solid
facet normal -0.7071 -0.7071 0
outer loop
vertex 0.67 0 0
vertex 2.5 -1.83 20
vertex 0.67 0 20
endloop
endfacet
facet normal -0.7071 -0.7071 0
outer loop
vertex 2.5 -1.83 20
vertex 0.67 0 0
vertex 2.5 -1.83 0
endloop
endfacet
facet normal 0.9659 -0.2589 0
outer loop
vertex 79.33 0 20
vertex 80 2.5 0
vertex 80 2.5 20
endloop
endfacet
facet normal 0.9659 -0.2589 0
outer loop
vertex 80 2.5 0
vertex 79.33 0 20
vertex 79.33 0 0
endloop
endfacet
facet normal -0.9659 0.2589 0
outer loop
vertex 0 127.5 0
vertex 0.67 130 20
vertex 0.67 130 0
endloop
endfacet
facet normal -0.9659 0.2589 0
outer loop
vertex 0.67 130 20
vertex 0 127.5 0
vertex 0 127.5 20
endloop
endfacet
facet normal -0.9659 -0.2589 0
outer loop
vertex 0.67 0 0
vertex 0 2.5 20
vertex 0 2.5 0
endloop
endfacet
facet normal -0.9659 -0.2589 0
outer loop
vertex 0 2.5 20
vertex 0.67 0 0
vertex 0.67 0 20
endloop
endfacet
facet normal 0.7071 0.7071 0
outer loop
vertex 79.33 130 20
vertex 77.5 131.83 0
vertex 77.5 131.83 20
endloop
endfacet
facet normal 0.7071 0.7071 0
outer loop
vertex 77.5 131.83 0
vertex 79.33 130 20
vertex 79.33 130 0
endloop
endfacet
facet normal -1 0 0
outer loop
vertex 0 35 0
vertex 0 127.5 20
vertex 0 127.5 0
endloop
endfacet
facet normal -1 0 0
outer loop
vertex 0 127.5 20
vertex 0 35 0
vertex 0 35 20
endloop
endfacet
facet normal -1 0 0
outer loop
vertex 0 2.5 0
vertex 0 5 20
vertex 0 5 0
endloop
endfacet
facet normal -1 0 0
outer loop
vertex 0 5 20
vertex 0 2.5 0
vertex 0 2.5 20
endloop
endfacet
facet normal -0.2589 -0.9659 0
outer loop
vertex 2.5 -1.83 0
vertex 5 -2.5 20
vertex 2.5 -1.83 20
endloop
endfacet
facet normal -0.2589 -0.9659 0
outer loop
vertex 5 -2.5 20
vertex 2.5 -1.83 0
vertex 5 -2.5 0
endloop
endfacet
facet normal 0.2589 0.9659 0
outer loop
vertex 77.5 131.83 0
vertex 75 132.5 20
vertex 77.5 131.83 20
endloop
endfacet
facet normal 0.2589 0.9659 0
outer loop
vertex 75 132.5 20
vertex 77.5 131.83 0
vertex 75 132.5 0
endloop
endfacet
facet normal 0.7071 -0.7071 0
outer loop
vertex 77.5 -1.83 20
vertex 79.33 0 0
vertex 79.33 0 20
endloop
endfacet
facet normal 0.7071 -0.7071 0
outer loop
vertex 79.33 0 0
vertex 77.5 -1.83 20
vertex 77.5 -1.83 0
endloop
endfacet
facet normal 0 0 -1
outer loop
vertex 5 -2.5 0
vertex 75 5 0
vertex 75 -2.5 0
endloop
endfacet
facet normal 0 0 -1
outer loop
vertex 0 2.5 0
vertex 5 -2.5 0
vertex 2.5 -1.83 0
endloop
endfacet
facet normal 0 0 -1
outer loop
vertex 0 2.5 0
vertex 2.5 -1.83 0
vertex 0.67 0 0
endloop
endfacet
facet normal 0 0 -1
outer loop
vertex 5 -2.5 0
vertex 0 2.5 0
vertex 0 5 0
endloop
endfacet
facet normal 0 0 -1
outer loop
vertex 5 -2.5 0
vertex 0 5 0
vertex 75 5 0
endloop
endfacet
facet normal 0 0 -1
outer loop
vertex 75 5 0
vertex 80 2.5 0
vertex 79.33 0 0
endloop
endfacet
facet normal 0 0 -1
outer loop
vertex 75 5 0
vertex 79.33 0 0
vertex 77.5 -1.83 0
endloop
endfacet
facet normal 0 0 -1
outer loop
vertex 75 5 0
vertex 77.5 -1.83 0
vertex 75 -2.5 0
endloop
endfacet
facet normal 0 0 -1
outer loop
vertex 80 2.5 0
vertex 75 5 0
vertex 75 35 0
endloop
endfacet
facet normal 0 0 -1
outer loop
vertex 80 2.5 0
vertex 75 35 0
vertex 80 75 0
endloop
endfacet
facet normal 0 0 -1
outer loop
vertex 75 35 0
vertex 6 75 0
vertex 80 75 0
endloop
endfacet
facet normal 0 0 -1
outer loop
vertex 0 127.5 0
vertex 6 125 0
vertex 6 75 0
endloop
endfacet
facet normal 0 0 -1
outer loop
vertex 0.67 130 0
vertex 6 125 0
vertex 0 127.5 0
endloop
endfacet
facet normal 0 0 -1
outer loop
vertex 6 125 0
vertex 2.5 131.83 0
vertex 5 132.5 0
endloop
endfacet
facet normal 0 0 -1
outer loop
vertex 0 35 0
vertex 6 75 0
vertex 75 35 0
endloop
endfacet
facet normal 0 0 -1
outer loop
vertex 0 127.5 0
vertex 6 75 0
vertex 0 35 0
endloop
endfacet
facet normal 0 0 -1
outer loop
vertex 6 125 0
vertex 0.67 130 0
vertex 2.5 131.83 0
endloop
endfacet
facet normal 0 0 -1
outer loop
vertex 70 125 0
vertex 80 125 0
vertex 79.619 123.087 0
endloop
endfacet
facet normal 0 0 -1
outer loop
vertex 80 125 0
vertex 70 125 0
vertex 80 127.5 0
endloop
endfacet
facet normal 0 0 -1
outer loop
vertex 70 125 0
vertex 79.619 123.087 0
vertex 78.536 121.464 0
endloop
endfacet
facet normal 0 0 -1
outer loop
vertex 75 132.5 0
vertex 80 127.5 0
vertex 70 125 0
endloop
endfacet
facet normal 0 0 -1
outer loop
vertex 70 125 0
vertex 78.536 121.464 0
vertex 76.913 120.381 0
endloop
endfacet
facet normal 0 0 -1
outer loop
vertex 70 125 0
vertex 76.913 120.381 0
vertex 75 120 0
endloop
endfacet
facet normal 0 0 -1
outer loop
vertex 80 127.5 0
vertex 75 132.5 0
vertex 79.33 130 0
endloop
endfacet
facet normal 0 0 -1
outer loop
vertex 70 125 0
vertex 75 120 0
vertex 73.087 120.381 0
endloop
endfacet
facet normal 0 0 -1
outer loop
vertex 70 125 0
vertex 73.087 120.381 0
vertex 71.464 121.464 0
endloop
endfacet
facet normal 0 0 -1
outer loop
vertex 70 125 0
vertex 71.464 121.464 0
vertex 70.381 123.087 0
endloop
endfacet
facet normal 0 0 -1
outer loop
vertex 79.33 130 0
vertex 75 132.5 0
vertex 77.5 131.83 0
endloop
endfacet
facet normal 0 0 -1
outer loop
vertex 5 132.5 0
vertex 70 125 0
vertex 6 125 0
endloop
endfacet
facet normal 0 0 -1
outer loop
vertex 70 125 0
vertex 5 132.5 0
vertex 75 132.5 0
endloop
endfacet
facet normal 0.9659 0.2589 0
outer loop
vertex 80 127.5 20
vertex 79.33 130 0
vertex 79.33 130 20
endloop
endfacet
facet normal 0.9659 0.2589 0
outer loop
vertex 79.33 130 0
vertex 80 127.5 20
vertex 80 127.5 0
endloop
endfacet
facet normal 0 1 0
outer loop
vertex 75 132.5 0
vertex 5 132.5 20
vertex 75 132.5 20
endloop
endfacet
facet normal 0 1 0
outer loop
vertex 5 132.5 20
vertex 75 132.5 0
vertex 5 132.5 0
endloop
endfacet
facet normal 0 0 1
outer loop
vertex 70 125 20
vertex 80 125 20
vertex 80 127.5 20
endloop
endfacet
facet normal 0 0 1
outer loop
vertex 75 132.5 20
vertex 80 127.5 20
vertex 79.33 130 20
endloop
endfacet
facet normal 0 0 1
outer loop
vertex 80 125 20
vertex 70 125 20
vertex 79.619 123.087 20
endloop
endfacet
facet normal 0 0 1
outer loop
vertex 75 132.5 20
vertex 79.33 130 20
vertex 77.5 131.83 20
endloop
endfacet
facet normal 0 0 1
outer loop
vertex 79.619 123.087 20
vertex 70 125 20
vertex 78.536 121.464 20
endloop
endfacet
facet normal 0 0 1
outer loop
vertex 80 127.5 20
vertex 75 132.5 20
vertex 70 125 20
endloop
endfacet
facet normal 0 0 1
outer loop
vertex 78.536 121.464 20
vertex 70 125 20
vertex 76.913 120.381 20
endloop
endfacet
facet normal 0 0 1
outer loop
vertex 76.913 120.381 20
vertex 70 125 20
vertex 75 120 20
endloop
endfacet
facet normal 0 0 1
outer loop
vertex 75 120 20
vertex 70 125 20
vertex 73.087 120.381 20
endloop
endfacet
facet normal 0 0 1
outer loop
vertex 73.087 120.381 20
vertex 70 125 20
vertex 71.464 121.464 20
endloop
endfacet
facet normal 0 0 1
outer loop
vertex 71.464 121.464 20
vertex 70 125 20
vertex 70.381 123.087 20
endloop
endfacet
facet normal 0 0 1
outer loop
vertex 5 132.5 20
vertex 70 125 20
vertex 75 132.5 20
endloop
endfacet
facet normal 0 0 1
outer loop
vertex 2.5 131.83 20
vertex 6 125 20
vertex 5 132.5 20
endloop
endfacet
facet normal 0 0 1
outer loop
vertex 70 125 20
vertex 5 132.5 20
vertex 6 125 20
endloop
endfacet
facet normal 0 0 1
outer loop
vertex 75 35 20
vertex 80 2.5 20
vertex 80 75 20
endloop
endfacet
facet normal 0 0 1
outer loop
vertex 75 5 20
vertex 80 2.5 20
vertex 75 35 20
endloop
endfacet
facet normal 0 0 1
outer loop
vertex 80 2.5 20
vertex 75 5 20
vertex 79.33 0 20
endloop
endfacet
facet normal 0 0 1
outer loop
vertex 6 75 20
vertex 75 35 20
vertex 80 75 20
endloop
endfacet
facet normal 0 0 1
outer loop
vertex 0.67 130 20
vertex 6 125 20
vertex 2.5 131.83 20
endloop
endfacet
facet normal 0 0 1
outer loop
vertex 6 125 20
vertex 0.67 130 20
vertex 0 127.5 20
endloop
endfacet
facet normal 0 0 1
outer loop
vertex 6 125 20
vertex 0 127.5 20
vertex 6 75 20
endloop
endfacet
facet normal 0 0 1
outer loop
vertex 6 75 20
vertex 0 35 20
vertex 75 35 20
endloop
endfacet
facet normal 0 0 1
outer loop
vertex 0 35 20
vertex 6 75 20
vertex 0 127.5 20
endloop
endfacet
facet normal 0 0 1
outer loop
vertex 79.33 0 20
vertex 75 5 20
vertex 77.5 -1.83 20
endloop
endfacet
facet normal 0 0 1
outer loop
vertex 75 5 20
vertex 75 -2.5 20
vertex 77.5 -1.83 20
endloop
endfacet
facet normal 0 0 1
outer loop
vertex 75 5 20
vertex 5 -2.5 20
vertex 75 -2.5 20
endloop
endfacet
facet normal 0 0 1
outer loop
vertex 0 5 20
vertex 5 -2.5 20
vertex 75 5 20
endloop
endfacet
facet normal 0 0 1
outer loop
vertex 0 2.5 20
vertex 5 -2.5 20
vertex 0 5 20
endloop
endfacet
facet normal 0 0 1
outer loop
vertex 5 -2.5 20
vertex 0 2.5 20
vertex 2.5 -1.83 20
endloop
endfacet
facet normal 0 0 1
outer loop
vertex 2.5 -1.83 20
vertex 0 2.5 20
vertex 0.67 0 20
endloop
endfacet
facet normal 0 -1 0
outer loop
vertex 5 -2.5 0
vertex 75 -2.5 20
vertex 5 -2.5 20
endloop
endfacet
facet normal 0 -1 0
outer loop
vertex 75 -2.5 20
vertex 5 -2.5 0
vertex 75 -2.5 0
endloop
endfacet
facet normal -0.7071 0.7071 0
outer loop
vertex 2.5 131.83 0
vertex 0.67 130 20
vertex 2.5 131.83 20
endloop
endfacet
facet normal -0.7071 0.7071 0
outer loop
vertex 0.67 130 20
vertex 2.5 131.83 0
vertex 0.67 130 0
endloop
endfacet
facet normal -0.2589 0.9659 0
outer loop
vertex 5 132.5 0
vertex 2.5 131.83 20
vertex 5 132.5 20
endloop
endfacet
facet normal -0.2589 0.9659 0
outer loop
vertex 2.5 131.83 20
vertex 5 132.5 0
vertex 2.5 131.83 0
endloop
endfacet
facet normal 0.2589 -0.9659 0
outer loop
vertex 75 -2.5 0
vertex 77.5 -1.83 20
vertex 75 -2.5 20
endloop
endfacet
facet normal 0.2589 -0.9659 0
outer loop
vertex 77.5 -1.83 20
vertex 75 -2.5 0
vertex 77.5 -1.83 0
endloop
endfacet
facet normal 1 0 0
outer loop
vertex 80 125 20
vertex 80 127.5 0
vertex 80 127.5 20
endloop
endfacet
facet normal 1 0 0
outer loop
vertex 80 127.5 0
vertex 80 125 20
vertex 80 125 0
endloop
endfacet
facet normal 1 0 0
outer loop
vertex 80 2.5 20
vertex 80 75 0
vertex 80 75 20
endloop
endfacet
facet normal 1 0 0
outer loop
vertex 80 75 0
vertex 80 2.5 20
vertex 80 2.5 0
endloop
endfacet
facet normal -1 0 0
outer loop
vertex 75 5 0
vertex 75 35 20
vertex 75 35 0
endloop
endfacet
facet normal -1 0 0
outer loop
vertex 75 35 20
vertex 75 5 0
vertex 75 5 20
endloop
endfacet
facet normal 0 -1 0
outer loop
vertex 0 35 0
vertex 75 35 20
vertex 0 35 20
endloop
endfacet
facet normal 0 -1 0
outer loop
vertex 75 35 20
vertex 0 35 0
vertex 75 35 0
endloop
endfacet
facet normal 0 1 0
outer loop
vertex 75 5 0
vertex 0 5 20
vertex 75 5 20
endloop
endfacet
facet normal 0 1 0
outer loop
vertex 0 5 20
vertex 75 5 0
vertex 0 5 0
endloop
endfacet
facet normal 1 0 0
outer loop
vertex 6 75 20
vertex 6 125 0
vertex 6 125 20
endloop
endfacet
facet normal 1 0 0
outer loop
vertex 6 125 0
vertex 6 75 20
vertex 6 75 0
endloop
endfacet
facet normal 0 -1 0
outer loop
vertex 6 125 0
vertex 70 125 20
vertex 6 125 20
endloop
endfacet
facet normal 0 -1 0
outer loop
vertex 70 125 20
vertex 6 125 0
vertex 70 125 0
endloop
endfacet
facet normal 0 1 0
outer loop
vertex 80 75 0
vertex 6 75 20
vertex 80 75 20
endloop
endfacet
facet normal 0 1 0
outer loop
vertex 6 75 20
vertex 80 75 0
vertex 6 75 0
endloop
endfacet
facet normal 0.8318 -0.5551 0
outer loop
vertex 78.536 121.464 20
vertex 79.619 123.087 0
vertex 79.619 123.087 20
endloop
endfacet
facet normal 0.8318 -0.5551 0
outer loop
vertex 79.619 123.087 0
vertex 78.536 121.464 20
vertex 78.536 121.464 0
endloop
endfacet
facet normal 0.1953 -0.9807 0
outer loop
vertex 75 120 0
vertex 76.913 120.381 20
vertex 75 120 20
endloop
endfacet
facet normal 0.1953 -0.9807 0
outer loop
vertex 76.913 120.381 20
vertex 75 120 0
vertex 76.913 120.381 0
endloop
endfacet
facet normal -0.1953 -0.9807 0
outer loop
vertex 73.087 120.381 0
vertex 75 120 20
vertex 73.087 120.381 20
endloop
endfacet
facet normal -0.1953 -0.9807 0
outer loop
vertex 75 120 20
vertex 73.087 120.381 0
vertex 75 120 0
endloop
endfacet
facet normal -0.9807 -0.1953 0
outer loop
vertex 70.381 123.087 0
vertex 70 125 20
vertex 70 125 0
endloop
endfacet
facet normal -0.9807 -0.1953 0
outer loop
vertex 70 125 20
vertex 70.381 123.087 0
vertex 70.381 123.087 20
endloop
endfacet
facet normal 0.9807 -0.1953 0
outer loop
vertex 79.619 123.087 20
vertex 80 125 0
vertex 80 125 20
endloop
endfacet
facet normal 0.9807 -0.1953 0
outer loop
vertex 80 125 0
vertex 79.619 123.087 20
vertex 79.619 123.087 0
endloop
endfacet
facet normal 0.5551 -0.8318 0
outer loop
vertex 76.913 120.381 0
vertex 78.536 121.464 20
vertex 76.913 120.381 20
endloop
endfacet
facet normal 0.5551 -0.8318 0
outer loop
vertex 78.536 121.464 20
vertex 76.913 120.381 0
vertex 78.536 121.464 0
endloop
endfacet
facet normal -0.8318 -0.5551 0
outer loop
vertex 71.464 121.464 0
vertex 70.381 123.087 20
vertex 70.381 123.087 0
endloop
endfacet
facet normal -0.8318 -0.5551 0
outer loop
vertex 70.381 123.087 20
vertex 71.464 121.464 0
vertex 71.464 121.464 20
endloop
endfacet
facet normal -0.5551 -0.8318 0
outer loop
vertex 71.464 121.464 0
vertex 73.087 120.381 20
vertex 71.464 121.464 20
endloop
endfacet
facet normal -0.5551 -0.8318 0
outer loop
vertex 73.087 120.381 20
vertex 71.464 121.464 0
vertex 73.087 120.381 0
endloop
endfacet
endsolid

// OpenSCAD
// [FL_INDEX: keywords="openscad, 3d_parametric, Customizable_Anything_Hook, csg_solid" | COT="Parametric OpenSCAD design from 3DCodeverse"]
// Title: Customizable Anything Hook

// Customizable Desk Hook
// by knarfishness
// Diesel Powered Robotics, 2013

// variables

//Total width
width = 80;

//Total length
length = 130;

// The width of the surface to clamp to
clamp_width = 30;

// The width of the hook
hook_width = 50;

// The thickness of the hook
thickness = 5;

// Hook height
height = 20;

// Catch Diameter 
catch = 5;

// Rounding Radius (1 to 40)
rounding_radius = 5;

// Clamp Depth Offset
clamp_offset = 0;

// Hook Depth Offset
hook_offset = 0;

add_catch = "true"; // [true,false]


// size - [x,y,z]
// radius - radius of corners
module roundedRect(size, radius)
{
	x = size[0];
	y = size[1];
	z = size[2];

	linear_extrude(height=z)
	hull()
	{
		// place 4 circles in the corners, with the given radius
		translate([(-x/2)+(radius/2), (-y/2)+(radius/2), 0])
		circle(r=radius);
	
		translate([(x/2)-(radius/2), (-y/2)+(radius/2), 0])
		circle(r=radius);
	
		translate([(-x/2)+(radius/2), (y/2)-(radius/2), 0])
		circle(r=radius);
	
		translate([(x/2)-(radius/2), (y/2)-(radius/2), 0])
		circle(r=radius);
	}
}


module base()
{
	//cube([width, length, height]);
	translate([width/2,length/2,0])
	roundedRect([width-rounding_radius, length, height], rounding_radius, $fn=12);
}

module clamp()
{
	translate([-1,thickness,-2])
	cube([width-thickness-clamp_offset+1, clamp_width, height+4]);
}

module hook()
{
	translate([thickness + hook_offset +1, length - hook_width - thickness,-2])
	cube([width-thickness+1, hook_width, height+4]);
}

module top()
{
	difference()
	{
		base();
		clamp();
	}
}

module loop()
{
	translate([width - catch,length-thickness,0])
	cylinder(h = height, r1 = catch, r2 = catch, center = false);
}

module final()
{
	difference()
	{
		top();
		hook();
	}
}

if(add_catch == "true")
{
	loop();
}

final();
